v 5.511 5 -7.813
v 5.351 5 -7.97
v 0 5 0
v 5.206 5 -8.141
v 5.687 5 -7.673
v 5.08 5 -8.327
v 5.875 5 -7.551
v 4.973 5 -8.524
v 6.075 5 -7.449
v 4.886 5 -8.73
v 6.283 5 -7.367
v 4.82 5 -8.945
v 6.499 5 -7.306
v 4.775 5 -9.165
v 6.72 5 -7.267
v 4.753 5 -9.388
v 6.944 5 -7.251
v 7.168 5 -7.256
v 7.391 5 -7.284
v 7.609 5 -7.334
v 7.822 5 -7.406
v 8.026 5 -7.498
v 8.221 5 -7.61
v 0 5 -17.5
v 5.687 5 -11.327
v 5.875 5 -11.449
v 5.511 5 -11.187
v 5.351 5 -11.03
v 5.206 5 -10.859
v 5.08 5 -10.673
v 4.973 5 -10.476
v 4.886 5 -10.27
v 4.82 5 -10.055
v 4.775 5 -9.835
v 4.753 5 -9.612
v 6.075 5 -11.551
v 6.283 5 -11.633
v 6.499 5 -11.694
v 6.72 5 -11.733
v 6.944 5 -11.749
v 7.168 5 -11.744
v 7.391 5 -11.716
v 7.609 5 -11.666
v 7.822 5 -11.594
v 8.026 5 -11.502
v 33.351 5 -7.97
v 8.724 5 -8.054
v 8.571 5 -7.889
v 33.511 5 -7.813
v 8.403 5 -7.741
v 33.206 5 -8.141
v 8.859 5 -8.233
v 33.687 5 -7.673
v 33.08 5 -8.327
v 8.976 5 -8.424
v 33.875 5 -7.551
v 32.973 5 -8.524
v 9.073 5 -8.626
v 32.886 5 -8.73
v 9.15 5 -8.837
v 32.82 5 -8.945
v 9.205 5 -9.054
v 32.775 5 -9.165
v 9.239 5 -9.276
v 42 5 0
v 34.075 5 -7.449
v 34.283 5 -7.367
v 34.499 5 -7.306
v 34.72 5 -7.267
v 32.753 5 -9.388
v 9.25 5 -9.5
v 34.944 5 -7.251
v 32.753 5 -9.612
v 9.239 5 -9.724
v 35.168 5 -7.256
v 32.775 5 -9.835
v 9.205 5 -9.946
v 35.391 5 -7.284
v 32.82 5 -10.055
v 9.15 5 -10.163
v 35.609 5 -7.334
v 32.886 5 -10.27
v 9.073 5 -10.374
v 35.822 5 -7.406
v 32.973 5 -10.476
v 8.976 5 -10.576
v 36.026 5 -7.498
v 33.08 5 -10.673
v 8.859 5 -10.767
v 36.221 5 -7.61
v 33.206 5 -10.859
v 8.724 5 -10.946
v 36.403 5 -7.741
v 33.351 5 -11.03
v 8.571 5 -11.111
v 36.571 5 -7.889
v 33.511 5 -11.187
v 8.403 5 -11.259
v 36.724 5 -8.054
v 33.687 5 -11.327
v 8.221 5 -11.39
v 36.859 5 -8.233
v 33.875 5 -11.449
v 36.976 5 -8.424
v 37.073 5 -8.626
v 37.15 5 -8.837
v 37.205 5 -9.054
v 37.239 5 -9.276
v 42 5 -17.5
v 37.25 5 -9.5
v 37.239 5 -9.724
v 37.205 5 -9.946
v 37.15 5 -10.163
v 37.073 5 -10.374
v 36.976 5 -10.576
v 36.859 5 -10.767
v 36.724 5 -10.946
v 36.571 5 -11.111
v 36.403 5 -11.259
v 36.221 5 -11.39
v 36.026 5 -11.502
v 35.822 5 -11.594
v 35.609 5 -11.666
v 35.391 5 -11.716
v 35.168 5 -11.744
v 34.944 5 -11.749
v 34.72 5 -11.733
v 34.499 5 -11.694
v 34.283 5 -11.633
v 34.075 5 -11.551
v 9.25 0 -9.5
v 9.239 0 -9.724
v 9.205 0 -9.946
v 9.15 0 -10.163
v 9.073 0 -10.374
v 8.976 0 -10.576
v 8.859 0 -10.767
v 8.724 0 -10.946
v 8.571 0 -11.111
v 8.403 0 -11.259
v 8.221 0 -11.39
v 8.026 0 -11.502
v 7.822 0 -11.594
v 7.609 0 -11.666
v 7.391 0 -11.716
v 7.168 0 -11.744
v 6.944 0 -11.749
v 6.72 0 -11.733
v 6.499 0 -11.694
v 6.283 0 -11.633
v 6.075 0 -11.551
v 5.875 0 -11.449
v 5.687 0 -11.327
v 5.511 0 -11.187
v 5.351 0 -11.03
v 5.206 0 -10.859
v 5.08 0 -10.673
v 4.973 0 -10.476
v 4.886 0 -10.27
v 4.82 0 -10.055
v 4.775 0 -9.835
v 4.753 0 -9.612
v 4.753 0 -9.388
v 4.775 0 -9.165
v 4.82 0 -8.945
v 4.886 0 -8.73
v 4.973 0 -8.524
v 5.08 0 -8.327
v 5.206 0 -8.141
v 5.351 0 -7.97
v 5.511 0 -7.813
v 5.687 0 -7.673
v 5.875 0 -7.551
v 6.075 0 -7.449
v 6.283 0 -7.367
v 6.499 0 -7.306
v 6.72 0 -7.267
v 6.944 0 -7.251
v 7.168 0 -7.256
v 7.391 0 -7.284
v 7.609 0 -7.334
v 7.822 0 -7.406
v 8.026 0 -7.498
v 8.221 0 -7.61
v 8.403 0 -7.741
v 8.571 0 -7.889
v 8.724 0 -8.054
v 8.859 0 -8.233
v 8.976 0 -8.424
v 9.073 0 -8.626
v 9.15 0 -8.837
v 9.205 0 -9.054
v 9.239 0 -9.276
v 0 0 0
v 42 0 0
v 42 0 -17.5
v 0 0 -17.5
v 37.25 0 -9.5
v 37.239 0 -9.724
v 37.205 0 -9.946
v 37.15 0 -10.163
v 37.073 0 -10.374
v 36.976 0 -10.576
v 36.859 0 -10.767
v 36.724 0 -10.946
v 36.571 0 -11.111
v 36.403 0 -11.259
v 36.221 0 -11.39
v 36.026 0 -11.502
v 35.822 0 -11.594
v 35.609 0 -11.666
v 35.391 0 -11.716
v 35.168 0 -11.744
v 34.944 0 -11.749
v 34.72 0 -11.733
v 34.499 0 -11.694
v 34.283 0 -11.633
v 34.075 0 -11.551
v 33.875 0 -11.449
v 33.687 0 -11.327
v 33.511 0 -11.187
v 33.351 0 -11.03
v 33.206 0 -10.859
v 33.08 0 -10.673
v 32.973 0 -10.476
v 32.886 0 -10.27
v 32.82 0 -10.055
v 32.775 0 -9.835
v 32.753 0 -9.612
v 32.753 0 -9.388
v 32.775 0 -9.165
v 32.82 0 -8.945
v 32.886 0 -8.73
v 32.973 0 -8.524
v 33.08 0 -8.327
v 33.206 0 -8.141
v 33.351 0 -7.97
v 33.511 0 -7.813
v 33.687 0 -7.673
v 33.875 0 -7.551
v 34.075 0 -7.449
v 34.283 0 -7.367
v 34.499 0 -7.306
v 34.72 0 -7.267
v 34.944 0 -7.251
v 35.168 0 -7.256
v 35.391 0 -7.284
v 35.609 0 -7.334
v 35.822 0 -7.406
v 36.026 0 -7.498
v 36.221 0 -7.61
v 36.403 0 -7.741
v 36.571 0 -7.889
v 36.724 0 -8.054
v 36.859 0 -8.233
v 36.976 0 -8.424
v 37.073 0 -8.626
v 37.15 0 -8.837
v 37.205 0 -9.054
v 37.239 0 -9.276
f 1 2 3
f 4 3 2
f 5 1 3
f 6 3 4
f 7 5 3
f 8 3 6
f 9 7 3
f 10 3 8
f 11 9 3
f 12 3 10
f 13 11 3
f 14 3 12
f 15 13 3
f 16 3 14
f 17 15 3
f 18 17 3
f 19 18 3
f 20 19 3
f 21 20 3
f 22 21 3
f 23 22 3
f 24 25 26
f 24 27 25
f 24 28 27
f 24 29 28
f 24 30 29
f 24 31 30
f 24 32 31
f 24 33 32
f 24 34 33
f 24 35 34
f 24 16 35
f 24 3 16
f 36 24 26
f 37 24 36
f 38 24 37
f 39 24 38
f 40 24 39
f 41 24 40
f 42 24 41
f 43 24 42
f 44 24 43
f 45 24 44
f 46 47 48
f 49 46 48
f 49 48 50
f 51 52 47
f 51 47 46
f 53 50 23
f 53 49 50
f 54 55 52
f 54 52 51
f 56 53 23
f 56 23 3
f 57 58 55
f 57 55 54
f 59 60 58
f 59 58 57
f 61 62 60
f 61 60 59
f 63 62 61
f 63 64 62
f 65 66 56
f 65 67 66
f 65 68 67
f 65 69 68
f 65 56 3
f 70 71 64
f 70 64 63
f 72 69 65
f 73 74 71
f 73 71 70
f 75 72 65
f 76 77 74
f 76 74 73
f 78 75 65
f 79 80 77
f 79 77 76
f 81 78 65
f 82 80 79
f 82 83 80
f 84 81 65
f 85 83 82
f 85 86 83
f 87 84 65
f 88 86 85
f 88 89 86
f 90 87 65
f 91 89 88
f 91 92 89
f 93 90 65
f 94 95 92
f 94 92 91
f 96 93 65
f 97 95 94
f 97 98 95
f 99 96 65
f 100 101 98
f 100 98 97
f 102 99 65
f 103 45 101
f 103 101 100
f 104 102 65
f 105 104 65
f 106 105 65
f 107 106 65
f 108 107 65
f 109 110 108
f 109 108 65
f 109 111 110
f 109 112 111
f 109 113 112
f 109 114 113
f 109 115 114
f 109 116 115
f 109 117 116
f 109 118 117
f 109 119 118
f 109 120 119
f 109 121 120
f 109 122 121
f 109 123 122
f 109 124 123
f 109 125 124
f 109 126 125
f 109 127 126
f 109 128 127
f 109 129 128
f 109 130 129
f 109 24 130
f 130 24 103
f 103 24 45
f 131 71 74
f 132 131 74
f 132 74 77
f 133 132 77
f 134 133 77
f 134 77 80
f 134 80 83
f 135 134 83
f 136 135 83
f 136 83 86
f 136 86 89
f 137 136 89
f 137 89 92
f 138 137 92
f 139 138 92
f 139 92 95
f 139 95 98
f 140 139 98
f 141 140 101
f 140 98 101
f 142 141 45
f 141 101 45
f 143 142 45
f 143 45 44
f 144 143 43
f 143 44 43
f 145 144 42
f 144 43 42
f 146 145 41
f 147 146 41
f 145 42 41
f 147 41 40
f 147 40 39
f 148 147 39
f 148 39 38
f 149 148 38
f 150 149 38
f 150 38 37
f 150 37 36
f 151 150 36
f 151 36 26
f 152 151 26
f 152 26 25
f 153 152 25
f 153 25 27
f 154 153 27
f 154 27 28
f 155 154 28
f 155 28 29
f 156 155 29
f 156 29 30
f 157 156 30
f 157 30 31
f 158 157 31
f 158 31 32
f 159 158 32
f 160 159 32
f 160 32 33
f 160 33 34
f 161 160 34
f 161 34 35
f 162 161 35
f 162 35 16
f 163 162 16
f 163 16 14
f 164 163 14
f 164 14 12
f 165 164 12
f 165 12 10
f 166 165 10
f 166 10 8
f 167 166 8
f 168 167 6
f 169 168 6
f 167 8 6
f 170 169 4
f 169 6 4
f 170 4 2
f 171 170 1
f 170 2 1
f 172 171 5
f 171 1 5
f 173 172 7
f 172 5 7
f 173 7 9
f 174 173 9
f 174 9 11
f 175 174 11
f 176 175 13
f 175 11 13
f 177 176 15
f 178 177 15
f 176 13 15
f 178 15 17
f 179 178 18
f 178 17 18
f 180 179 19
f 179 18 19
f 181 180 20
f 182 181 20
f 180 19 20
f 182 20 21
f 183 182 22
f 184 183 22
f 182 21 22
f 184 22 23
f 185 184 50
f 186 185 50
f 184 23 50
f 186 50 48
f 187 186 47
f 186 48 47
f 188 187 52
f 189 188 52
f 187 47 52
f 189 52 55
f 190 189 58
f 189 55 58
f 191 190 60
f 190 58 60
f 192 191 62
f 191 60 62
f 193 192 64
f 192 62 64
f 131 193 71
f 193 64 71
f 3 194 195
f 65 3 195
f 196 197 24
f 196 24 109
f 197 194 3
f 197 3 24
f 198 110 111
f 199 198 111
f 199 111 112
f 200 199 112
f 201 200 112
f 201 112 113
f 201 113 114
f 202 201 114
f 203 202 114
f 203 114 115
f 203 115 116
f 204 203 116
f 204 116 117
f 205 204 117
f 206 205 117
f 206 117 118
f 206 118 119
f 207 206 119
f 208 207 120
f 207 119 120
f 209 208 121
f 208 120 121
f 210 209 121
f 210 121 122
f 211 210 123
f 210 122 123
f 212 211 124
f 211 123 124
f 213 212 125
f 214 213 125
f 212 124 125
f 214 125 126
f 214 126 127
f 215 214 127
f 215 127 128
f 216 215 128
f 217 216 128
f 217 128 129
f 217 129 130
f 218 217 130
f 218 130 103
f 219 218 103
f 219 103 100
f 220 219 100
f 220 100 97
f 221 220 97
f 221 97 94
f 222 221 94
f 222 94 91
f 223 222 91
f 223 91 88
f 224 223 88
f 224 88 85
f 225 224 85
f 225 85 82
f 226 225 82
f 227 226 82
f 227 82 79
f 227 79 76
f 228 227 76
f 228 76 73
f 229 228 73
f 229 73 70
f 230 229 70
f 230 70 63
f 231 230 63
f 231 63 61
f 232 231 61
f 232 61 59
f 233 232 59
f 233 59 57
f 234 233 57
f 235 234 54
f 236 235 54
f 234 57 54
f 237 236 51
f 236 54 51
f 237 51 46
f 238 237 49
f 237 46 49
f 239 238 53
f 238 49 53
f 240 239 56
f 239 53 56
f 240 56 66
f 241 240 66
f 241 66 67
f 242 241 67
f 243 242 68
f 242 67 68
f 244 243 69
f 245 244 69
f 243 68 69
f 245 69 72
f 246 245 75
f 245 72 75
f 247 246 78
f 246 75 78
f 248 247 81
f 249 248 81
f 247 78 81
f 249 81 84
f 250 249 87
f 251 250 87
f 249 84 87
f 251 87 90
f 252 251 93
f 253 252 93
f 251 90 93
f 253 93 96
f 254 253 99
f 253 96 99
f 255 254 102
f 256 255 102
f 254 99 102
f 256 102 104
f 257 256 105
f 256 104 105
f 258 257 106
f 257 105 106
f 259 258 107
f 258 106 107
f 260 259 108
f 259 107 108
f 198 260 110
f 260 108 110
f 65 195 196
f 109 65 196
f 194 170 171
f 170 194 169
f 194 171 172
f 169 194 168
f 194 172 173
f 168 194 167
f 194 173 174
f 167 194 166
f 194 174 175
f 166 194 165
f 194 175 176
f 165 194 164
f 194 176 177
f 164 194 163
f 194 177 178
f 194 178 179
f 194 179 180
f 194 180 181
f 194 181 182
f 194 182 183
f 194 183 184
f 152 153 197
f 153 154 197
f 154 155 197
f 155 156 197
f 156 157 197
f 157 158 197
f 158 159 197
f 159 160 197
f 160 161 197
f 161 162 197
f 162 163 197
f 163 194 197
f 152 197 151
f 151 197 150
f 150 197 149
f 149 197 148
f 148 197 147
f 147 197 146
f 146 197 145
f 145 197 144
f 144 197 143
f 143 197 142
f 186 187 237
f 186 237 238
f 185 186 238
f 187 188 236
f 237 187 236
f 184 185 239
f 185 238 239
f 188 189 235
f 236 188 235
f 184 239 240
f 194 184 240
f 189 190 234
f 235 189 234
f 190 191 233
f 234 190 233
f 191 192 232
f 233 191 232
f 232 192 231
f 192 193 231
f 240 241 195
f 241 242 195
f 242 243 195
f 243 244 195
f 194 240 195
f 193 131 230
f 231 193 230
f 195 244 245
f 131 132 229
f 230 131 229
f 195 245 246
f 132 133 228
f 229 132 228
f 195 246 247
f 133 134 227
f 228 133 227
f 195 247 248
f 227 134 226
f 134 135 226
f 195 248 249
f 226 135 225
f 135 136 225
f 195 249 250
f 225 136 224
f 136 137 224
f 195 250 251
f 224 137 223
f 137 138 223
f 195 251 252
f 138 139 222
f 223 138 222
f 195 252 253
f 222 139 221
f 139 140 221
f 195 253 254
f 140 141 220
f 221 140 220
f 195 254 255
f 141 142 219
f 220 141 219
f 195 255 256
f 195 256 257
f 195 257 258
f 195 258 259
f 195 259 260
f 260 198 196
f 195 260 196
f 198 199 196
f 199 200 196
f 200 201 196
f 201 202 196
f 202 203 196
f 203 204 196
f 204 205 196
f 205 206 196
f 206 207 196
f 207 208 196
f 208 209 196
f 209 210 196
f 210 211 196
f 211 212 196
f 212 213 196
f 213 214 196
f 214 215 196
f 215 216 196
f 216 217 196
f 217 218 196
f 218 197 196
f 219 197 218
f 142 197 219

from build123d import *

# Parameters (mm, degrees)
SKETCH1_W           = 42
SKETCH1_H           = 17.5
BOSS_EXTRUDE1_DEPTH = 5
SKETCH2_R           = 2.25
CUT_EXTRUDE1_DEPTH  = 6


with BuildPart() as part:
    # Sketch1 → Boss-Extrude1 (new body)
    with BuildSketch(Plane(origin=(0, 0, 0), x_dir=(1, 0, 0), z_dir=(0, 1, 0))):
        with Locations((21, 8.75)):
            Rectangle(SKETCH1_W, SKETCH1_H)
    extrude(amount=BOSS_EXTRUDE1_DEPTH)

    # Sketch2 → Cut-Extrude1 (cut, through all)
    with BuildSketch(Plane(origin=(0, 5, 0), x_dir=(1, 0, 0), z_dir=(0, 1, 0))):
        with Locations((7, 9.5)):
            Circle(SKETCH2_R)
        with Locations((35, 9.5)):
            Circle(SKETCH2_R)
    extrude(amount=-CUT_EXTRUDE1_DEPTH, mode=Mode.SUBTRACT)


solid = part.part
